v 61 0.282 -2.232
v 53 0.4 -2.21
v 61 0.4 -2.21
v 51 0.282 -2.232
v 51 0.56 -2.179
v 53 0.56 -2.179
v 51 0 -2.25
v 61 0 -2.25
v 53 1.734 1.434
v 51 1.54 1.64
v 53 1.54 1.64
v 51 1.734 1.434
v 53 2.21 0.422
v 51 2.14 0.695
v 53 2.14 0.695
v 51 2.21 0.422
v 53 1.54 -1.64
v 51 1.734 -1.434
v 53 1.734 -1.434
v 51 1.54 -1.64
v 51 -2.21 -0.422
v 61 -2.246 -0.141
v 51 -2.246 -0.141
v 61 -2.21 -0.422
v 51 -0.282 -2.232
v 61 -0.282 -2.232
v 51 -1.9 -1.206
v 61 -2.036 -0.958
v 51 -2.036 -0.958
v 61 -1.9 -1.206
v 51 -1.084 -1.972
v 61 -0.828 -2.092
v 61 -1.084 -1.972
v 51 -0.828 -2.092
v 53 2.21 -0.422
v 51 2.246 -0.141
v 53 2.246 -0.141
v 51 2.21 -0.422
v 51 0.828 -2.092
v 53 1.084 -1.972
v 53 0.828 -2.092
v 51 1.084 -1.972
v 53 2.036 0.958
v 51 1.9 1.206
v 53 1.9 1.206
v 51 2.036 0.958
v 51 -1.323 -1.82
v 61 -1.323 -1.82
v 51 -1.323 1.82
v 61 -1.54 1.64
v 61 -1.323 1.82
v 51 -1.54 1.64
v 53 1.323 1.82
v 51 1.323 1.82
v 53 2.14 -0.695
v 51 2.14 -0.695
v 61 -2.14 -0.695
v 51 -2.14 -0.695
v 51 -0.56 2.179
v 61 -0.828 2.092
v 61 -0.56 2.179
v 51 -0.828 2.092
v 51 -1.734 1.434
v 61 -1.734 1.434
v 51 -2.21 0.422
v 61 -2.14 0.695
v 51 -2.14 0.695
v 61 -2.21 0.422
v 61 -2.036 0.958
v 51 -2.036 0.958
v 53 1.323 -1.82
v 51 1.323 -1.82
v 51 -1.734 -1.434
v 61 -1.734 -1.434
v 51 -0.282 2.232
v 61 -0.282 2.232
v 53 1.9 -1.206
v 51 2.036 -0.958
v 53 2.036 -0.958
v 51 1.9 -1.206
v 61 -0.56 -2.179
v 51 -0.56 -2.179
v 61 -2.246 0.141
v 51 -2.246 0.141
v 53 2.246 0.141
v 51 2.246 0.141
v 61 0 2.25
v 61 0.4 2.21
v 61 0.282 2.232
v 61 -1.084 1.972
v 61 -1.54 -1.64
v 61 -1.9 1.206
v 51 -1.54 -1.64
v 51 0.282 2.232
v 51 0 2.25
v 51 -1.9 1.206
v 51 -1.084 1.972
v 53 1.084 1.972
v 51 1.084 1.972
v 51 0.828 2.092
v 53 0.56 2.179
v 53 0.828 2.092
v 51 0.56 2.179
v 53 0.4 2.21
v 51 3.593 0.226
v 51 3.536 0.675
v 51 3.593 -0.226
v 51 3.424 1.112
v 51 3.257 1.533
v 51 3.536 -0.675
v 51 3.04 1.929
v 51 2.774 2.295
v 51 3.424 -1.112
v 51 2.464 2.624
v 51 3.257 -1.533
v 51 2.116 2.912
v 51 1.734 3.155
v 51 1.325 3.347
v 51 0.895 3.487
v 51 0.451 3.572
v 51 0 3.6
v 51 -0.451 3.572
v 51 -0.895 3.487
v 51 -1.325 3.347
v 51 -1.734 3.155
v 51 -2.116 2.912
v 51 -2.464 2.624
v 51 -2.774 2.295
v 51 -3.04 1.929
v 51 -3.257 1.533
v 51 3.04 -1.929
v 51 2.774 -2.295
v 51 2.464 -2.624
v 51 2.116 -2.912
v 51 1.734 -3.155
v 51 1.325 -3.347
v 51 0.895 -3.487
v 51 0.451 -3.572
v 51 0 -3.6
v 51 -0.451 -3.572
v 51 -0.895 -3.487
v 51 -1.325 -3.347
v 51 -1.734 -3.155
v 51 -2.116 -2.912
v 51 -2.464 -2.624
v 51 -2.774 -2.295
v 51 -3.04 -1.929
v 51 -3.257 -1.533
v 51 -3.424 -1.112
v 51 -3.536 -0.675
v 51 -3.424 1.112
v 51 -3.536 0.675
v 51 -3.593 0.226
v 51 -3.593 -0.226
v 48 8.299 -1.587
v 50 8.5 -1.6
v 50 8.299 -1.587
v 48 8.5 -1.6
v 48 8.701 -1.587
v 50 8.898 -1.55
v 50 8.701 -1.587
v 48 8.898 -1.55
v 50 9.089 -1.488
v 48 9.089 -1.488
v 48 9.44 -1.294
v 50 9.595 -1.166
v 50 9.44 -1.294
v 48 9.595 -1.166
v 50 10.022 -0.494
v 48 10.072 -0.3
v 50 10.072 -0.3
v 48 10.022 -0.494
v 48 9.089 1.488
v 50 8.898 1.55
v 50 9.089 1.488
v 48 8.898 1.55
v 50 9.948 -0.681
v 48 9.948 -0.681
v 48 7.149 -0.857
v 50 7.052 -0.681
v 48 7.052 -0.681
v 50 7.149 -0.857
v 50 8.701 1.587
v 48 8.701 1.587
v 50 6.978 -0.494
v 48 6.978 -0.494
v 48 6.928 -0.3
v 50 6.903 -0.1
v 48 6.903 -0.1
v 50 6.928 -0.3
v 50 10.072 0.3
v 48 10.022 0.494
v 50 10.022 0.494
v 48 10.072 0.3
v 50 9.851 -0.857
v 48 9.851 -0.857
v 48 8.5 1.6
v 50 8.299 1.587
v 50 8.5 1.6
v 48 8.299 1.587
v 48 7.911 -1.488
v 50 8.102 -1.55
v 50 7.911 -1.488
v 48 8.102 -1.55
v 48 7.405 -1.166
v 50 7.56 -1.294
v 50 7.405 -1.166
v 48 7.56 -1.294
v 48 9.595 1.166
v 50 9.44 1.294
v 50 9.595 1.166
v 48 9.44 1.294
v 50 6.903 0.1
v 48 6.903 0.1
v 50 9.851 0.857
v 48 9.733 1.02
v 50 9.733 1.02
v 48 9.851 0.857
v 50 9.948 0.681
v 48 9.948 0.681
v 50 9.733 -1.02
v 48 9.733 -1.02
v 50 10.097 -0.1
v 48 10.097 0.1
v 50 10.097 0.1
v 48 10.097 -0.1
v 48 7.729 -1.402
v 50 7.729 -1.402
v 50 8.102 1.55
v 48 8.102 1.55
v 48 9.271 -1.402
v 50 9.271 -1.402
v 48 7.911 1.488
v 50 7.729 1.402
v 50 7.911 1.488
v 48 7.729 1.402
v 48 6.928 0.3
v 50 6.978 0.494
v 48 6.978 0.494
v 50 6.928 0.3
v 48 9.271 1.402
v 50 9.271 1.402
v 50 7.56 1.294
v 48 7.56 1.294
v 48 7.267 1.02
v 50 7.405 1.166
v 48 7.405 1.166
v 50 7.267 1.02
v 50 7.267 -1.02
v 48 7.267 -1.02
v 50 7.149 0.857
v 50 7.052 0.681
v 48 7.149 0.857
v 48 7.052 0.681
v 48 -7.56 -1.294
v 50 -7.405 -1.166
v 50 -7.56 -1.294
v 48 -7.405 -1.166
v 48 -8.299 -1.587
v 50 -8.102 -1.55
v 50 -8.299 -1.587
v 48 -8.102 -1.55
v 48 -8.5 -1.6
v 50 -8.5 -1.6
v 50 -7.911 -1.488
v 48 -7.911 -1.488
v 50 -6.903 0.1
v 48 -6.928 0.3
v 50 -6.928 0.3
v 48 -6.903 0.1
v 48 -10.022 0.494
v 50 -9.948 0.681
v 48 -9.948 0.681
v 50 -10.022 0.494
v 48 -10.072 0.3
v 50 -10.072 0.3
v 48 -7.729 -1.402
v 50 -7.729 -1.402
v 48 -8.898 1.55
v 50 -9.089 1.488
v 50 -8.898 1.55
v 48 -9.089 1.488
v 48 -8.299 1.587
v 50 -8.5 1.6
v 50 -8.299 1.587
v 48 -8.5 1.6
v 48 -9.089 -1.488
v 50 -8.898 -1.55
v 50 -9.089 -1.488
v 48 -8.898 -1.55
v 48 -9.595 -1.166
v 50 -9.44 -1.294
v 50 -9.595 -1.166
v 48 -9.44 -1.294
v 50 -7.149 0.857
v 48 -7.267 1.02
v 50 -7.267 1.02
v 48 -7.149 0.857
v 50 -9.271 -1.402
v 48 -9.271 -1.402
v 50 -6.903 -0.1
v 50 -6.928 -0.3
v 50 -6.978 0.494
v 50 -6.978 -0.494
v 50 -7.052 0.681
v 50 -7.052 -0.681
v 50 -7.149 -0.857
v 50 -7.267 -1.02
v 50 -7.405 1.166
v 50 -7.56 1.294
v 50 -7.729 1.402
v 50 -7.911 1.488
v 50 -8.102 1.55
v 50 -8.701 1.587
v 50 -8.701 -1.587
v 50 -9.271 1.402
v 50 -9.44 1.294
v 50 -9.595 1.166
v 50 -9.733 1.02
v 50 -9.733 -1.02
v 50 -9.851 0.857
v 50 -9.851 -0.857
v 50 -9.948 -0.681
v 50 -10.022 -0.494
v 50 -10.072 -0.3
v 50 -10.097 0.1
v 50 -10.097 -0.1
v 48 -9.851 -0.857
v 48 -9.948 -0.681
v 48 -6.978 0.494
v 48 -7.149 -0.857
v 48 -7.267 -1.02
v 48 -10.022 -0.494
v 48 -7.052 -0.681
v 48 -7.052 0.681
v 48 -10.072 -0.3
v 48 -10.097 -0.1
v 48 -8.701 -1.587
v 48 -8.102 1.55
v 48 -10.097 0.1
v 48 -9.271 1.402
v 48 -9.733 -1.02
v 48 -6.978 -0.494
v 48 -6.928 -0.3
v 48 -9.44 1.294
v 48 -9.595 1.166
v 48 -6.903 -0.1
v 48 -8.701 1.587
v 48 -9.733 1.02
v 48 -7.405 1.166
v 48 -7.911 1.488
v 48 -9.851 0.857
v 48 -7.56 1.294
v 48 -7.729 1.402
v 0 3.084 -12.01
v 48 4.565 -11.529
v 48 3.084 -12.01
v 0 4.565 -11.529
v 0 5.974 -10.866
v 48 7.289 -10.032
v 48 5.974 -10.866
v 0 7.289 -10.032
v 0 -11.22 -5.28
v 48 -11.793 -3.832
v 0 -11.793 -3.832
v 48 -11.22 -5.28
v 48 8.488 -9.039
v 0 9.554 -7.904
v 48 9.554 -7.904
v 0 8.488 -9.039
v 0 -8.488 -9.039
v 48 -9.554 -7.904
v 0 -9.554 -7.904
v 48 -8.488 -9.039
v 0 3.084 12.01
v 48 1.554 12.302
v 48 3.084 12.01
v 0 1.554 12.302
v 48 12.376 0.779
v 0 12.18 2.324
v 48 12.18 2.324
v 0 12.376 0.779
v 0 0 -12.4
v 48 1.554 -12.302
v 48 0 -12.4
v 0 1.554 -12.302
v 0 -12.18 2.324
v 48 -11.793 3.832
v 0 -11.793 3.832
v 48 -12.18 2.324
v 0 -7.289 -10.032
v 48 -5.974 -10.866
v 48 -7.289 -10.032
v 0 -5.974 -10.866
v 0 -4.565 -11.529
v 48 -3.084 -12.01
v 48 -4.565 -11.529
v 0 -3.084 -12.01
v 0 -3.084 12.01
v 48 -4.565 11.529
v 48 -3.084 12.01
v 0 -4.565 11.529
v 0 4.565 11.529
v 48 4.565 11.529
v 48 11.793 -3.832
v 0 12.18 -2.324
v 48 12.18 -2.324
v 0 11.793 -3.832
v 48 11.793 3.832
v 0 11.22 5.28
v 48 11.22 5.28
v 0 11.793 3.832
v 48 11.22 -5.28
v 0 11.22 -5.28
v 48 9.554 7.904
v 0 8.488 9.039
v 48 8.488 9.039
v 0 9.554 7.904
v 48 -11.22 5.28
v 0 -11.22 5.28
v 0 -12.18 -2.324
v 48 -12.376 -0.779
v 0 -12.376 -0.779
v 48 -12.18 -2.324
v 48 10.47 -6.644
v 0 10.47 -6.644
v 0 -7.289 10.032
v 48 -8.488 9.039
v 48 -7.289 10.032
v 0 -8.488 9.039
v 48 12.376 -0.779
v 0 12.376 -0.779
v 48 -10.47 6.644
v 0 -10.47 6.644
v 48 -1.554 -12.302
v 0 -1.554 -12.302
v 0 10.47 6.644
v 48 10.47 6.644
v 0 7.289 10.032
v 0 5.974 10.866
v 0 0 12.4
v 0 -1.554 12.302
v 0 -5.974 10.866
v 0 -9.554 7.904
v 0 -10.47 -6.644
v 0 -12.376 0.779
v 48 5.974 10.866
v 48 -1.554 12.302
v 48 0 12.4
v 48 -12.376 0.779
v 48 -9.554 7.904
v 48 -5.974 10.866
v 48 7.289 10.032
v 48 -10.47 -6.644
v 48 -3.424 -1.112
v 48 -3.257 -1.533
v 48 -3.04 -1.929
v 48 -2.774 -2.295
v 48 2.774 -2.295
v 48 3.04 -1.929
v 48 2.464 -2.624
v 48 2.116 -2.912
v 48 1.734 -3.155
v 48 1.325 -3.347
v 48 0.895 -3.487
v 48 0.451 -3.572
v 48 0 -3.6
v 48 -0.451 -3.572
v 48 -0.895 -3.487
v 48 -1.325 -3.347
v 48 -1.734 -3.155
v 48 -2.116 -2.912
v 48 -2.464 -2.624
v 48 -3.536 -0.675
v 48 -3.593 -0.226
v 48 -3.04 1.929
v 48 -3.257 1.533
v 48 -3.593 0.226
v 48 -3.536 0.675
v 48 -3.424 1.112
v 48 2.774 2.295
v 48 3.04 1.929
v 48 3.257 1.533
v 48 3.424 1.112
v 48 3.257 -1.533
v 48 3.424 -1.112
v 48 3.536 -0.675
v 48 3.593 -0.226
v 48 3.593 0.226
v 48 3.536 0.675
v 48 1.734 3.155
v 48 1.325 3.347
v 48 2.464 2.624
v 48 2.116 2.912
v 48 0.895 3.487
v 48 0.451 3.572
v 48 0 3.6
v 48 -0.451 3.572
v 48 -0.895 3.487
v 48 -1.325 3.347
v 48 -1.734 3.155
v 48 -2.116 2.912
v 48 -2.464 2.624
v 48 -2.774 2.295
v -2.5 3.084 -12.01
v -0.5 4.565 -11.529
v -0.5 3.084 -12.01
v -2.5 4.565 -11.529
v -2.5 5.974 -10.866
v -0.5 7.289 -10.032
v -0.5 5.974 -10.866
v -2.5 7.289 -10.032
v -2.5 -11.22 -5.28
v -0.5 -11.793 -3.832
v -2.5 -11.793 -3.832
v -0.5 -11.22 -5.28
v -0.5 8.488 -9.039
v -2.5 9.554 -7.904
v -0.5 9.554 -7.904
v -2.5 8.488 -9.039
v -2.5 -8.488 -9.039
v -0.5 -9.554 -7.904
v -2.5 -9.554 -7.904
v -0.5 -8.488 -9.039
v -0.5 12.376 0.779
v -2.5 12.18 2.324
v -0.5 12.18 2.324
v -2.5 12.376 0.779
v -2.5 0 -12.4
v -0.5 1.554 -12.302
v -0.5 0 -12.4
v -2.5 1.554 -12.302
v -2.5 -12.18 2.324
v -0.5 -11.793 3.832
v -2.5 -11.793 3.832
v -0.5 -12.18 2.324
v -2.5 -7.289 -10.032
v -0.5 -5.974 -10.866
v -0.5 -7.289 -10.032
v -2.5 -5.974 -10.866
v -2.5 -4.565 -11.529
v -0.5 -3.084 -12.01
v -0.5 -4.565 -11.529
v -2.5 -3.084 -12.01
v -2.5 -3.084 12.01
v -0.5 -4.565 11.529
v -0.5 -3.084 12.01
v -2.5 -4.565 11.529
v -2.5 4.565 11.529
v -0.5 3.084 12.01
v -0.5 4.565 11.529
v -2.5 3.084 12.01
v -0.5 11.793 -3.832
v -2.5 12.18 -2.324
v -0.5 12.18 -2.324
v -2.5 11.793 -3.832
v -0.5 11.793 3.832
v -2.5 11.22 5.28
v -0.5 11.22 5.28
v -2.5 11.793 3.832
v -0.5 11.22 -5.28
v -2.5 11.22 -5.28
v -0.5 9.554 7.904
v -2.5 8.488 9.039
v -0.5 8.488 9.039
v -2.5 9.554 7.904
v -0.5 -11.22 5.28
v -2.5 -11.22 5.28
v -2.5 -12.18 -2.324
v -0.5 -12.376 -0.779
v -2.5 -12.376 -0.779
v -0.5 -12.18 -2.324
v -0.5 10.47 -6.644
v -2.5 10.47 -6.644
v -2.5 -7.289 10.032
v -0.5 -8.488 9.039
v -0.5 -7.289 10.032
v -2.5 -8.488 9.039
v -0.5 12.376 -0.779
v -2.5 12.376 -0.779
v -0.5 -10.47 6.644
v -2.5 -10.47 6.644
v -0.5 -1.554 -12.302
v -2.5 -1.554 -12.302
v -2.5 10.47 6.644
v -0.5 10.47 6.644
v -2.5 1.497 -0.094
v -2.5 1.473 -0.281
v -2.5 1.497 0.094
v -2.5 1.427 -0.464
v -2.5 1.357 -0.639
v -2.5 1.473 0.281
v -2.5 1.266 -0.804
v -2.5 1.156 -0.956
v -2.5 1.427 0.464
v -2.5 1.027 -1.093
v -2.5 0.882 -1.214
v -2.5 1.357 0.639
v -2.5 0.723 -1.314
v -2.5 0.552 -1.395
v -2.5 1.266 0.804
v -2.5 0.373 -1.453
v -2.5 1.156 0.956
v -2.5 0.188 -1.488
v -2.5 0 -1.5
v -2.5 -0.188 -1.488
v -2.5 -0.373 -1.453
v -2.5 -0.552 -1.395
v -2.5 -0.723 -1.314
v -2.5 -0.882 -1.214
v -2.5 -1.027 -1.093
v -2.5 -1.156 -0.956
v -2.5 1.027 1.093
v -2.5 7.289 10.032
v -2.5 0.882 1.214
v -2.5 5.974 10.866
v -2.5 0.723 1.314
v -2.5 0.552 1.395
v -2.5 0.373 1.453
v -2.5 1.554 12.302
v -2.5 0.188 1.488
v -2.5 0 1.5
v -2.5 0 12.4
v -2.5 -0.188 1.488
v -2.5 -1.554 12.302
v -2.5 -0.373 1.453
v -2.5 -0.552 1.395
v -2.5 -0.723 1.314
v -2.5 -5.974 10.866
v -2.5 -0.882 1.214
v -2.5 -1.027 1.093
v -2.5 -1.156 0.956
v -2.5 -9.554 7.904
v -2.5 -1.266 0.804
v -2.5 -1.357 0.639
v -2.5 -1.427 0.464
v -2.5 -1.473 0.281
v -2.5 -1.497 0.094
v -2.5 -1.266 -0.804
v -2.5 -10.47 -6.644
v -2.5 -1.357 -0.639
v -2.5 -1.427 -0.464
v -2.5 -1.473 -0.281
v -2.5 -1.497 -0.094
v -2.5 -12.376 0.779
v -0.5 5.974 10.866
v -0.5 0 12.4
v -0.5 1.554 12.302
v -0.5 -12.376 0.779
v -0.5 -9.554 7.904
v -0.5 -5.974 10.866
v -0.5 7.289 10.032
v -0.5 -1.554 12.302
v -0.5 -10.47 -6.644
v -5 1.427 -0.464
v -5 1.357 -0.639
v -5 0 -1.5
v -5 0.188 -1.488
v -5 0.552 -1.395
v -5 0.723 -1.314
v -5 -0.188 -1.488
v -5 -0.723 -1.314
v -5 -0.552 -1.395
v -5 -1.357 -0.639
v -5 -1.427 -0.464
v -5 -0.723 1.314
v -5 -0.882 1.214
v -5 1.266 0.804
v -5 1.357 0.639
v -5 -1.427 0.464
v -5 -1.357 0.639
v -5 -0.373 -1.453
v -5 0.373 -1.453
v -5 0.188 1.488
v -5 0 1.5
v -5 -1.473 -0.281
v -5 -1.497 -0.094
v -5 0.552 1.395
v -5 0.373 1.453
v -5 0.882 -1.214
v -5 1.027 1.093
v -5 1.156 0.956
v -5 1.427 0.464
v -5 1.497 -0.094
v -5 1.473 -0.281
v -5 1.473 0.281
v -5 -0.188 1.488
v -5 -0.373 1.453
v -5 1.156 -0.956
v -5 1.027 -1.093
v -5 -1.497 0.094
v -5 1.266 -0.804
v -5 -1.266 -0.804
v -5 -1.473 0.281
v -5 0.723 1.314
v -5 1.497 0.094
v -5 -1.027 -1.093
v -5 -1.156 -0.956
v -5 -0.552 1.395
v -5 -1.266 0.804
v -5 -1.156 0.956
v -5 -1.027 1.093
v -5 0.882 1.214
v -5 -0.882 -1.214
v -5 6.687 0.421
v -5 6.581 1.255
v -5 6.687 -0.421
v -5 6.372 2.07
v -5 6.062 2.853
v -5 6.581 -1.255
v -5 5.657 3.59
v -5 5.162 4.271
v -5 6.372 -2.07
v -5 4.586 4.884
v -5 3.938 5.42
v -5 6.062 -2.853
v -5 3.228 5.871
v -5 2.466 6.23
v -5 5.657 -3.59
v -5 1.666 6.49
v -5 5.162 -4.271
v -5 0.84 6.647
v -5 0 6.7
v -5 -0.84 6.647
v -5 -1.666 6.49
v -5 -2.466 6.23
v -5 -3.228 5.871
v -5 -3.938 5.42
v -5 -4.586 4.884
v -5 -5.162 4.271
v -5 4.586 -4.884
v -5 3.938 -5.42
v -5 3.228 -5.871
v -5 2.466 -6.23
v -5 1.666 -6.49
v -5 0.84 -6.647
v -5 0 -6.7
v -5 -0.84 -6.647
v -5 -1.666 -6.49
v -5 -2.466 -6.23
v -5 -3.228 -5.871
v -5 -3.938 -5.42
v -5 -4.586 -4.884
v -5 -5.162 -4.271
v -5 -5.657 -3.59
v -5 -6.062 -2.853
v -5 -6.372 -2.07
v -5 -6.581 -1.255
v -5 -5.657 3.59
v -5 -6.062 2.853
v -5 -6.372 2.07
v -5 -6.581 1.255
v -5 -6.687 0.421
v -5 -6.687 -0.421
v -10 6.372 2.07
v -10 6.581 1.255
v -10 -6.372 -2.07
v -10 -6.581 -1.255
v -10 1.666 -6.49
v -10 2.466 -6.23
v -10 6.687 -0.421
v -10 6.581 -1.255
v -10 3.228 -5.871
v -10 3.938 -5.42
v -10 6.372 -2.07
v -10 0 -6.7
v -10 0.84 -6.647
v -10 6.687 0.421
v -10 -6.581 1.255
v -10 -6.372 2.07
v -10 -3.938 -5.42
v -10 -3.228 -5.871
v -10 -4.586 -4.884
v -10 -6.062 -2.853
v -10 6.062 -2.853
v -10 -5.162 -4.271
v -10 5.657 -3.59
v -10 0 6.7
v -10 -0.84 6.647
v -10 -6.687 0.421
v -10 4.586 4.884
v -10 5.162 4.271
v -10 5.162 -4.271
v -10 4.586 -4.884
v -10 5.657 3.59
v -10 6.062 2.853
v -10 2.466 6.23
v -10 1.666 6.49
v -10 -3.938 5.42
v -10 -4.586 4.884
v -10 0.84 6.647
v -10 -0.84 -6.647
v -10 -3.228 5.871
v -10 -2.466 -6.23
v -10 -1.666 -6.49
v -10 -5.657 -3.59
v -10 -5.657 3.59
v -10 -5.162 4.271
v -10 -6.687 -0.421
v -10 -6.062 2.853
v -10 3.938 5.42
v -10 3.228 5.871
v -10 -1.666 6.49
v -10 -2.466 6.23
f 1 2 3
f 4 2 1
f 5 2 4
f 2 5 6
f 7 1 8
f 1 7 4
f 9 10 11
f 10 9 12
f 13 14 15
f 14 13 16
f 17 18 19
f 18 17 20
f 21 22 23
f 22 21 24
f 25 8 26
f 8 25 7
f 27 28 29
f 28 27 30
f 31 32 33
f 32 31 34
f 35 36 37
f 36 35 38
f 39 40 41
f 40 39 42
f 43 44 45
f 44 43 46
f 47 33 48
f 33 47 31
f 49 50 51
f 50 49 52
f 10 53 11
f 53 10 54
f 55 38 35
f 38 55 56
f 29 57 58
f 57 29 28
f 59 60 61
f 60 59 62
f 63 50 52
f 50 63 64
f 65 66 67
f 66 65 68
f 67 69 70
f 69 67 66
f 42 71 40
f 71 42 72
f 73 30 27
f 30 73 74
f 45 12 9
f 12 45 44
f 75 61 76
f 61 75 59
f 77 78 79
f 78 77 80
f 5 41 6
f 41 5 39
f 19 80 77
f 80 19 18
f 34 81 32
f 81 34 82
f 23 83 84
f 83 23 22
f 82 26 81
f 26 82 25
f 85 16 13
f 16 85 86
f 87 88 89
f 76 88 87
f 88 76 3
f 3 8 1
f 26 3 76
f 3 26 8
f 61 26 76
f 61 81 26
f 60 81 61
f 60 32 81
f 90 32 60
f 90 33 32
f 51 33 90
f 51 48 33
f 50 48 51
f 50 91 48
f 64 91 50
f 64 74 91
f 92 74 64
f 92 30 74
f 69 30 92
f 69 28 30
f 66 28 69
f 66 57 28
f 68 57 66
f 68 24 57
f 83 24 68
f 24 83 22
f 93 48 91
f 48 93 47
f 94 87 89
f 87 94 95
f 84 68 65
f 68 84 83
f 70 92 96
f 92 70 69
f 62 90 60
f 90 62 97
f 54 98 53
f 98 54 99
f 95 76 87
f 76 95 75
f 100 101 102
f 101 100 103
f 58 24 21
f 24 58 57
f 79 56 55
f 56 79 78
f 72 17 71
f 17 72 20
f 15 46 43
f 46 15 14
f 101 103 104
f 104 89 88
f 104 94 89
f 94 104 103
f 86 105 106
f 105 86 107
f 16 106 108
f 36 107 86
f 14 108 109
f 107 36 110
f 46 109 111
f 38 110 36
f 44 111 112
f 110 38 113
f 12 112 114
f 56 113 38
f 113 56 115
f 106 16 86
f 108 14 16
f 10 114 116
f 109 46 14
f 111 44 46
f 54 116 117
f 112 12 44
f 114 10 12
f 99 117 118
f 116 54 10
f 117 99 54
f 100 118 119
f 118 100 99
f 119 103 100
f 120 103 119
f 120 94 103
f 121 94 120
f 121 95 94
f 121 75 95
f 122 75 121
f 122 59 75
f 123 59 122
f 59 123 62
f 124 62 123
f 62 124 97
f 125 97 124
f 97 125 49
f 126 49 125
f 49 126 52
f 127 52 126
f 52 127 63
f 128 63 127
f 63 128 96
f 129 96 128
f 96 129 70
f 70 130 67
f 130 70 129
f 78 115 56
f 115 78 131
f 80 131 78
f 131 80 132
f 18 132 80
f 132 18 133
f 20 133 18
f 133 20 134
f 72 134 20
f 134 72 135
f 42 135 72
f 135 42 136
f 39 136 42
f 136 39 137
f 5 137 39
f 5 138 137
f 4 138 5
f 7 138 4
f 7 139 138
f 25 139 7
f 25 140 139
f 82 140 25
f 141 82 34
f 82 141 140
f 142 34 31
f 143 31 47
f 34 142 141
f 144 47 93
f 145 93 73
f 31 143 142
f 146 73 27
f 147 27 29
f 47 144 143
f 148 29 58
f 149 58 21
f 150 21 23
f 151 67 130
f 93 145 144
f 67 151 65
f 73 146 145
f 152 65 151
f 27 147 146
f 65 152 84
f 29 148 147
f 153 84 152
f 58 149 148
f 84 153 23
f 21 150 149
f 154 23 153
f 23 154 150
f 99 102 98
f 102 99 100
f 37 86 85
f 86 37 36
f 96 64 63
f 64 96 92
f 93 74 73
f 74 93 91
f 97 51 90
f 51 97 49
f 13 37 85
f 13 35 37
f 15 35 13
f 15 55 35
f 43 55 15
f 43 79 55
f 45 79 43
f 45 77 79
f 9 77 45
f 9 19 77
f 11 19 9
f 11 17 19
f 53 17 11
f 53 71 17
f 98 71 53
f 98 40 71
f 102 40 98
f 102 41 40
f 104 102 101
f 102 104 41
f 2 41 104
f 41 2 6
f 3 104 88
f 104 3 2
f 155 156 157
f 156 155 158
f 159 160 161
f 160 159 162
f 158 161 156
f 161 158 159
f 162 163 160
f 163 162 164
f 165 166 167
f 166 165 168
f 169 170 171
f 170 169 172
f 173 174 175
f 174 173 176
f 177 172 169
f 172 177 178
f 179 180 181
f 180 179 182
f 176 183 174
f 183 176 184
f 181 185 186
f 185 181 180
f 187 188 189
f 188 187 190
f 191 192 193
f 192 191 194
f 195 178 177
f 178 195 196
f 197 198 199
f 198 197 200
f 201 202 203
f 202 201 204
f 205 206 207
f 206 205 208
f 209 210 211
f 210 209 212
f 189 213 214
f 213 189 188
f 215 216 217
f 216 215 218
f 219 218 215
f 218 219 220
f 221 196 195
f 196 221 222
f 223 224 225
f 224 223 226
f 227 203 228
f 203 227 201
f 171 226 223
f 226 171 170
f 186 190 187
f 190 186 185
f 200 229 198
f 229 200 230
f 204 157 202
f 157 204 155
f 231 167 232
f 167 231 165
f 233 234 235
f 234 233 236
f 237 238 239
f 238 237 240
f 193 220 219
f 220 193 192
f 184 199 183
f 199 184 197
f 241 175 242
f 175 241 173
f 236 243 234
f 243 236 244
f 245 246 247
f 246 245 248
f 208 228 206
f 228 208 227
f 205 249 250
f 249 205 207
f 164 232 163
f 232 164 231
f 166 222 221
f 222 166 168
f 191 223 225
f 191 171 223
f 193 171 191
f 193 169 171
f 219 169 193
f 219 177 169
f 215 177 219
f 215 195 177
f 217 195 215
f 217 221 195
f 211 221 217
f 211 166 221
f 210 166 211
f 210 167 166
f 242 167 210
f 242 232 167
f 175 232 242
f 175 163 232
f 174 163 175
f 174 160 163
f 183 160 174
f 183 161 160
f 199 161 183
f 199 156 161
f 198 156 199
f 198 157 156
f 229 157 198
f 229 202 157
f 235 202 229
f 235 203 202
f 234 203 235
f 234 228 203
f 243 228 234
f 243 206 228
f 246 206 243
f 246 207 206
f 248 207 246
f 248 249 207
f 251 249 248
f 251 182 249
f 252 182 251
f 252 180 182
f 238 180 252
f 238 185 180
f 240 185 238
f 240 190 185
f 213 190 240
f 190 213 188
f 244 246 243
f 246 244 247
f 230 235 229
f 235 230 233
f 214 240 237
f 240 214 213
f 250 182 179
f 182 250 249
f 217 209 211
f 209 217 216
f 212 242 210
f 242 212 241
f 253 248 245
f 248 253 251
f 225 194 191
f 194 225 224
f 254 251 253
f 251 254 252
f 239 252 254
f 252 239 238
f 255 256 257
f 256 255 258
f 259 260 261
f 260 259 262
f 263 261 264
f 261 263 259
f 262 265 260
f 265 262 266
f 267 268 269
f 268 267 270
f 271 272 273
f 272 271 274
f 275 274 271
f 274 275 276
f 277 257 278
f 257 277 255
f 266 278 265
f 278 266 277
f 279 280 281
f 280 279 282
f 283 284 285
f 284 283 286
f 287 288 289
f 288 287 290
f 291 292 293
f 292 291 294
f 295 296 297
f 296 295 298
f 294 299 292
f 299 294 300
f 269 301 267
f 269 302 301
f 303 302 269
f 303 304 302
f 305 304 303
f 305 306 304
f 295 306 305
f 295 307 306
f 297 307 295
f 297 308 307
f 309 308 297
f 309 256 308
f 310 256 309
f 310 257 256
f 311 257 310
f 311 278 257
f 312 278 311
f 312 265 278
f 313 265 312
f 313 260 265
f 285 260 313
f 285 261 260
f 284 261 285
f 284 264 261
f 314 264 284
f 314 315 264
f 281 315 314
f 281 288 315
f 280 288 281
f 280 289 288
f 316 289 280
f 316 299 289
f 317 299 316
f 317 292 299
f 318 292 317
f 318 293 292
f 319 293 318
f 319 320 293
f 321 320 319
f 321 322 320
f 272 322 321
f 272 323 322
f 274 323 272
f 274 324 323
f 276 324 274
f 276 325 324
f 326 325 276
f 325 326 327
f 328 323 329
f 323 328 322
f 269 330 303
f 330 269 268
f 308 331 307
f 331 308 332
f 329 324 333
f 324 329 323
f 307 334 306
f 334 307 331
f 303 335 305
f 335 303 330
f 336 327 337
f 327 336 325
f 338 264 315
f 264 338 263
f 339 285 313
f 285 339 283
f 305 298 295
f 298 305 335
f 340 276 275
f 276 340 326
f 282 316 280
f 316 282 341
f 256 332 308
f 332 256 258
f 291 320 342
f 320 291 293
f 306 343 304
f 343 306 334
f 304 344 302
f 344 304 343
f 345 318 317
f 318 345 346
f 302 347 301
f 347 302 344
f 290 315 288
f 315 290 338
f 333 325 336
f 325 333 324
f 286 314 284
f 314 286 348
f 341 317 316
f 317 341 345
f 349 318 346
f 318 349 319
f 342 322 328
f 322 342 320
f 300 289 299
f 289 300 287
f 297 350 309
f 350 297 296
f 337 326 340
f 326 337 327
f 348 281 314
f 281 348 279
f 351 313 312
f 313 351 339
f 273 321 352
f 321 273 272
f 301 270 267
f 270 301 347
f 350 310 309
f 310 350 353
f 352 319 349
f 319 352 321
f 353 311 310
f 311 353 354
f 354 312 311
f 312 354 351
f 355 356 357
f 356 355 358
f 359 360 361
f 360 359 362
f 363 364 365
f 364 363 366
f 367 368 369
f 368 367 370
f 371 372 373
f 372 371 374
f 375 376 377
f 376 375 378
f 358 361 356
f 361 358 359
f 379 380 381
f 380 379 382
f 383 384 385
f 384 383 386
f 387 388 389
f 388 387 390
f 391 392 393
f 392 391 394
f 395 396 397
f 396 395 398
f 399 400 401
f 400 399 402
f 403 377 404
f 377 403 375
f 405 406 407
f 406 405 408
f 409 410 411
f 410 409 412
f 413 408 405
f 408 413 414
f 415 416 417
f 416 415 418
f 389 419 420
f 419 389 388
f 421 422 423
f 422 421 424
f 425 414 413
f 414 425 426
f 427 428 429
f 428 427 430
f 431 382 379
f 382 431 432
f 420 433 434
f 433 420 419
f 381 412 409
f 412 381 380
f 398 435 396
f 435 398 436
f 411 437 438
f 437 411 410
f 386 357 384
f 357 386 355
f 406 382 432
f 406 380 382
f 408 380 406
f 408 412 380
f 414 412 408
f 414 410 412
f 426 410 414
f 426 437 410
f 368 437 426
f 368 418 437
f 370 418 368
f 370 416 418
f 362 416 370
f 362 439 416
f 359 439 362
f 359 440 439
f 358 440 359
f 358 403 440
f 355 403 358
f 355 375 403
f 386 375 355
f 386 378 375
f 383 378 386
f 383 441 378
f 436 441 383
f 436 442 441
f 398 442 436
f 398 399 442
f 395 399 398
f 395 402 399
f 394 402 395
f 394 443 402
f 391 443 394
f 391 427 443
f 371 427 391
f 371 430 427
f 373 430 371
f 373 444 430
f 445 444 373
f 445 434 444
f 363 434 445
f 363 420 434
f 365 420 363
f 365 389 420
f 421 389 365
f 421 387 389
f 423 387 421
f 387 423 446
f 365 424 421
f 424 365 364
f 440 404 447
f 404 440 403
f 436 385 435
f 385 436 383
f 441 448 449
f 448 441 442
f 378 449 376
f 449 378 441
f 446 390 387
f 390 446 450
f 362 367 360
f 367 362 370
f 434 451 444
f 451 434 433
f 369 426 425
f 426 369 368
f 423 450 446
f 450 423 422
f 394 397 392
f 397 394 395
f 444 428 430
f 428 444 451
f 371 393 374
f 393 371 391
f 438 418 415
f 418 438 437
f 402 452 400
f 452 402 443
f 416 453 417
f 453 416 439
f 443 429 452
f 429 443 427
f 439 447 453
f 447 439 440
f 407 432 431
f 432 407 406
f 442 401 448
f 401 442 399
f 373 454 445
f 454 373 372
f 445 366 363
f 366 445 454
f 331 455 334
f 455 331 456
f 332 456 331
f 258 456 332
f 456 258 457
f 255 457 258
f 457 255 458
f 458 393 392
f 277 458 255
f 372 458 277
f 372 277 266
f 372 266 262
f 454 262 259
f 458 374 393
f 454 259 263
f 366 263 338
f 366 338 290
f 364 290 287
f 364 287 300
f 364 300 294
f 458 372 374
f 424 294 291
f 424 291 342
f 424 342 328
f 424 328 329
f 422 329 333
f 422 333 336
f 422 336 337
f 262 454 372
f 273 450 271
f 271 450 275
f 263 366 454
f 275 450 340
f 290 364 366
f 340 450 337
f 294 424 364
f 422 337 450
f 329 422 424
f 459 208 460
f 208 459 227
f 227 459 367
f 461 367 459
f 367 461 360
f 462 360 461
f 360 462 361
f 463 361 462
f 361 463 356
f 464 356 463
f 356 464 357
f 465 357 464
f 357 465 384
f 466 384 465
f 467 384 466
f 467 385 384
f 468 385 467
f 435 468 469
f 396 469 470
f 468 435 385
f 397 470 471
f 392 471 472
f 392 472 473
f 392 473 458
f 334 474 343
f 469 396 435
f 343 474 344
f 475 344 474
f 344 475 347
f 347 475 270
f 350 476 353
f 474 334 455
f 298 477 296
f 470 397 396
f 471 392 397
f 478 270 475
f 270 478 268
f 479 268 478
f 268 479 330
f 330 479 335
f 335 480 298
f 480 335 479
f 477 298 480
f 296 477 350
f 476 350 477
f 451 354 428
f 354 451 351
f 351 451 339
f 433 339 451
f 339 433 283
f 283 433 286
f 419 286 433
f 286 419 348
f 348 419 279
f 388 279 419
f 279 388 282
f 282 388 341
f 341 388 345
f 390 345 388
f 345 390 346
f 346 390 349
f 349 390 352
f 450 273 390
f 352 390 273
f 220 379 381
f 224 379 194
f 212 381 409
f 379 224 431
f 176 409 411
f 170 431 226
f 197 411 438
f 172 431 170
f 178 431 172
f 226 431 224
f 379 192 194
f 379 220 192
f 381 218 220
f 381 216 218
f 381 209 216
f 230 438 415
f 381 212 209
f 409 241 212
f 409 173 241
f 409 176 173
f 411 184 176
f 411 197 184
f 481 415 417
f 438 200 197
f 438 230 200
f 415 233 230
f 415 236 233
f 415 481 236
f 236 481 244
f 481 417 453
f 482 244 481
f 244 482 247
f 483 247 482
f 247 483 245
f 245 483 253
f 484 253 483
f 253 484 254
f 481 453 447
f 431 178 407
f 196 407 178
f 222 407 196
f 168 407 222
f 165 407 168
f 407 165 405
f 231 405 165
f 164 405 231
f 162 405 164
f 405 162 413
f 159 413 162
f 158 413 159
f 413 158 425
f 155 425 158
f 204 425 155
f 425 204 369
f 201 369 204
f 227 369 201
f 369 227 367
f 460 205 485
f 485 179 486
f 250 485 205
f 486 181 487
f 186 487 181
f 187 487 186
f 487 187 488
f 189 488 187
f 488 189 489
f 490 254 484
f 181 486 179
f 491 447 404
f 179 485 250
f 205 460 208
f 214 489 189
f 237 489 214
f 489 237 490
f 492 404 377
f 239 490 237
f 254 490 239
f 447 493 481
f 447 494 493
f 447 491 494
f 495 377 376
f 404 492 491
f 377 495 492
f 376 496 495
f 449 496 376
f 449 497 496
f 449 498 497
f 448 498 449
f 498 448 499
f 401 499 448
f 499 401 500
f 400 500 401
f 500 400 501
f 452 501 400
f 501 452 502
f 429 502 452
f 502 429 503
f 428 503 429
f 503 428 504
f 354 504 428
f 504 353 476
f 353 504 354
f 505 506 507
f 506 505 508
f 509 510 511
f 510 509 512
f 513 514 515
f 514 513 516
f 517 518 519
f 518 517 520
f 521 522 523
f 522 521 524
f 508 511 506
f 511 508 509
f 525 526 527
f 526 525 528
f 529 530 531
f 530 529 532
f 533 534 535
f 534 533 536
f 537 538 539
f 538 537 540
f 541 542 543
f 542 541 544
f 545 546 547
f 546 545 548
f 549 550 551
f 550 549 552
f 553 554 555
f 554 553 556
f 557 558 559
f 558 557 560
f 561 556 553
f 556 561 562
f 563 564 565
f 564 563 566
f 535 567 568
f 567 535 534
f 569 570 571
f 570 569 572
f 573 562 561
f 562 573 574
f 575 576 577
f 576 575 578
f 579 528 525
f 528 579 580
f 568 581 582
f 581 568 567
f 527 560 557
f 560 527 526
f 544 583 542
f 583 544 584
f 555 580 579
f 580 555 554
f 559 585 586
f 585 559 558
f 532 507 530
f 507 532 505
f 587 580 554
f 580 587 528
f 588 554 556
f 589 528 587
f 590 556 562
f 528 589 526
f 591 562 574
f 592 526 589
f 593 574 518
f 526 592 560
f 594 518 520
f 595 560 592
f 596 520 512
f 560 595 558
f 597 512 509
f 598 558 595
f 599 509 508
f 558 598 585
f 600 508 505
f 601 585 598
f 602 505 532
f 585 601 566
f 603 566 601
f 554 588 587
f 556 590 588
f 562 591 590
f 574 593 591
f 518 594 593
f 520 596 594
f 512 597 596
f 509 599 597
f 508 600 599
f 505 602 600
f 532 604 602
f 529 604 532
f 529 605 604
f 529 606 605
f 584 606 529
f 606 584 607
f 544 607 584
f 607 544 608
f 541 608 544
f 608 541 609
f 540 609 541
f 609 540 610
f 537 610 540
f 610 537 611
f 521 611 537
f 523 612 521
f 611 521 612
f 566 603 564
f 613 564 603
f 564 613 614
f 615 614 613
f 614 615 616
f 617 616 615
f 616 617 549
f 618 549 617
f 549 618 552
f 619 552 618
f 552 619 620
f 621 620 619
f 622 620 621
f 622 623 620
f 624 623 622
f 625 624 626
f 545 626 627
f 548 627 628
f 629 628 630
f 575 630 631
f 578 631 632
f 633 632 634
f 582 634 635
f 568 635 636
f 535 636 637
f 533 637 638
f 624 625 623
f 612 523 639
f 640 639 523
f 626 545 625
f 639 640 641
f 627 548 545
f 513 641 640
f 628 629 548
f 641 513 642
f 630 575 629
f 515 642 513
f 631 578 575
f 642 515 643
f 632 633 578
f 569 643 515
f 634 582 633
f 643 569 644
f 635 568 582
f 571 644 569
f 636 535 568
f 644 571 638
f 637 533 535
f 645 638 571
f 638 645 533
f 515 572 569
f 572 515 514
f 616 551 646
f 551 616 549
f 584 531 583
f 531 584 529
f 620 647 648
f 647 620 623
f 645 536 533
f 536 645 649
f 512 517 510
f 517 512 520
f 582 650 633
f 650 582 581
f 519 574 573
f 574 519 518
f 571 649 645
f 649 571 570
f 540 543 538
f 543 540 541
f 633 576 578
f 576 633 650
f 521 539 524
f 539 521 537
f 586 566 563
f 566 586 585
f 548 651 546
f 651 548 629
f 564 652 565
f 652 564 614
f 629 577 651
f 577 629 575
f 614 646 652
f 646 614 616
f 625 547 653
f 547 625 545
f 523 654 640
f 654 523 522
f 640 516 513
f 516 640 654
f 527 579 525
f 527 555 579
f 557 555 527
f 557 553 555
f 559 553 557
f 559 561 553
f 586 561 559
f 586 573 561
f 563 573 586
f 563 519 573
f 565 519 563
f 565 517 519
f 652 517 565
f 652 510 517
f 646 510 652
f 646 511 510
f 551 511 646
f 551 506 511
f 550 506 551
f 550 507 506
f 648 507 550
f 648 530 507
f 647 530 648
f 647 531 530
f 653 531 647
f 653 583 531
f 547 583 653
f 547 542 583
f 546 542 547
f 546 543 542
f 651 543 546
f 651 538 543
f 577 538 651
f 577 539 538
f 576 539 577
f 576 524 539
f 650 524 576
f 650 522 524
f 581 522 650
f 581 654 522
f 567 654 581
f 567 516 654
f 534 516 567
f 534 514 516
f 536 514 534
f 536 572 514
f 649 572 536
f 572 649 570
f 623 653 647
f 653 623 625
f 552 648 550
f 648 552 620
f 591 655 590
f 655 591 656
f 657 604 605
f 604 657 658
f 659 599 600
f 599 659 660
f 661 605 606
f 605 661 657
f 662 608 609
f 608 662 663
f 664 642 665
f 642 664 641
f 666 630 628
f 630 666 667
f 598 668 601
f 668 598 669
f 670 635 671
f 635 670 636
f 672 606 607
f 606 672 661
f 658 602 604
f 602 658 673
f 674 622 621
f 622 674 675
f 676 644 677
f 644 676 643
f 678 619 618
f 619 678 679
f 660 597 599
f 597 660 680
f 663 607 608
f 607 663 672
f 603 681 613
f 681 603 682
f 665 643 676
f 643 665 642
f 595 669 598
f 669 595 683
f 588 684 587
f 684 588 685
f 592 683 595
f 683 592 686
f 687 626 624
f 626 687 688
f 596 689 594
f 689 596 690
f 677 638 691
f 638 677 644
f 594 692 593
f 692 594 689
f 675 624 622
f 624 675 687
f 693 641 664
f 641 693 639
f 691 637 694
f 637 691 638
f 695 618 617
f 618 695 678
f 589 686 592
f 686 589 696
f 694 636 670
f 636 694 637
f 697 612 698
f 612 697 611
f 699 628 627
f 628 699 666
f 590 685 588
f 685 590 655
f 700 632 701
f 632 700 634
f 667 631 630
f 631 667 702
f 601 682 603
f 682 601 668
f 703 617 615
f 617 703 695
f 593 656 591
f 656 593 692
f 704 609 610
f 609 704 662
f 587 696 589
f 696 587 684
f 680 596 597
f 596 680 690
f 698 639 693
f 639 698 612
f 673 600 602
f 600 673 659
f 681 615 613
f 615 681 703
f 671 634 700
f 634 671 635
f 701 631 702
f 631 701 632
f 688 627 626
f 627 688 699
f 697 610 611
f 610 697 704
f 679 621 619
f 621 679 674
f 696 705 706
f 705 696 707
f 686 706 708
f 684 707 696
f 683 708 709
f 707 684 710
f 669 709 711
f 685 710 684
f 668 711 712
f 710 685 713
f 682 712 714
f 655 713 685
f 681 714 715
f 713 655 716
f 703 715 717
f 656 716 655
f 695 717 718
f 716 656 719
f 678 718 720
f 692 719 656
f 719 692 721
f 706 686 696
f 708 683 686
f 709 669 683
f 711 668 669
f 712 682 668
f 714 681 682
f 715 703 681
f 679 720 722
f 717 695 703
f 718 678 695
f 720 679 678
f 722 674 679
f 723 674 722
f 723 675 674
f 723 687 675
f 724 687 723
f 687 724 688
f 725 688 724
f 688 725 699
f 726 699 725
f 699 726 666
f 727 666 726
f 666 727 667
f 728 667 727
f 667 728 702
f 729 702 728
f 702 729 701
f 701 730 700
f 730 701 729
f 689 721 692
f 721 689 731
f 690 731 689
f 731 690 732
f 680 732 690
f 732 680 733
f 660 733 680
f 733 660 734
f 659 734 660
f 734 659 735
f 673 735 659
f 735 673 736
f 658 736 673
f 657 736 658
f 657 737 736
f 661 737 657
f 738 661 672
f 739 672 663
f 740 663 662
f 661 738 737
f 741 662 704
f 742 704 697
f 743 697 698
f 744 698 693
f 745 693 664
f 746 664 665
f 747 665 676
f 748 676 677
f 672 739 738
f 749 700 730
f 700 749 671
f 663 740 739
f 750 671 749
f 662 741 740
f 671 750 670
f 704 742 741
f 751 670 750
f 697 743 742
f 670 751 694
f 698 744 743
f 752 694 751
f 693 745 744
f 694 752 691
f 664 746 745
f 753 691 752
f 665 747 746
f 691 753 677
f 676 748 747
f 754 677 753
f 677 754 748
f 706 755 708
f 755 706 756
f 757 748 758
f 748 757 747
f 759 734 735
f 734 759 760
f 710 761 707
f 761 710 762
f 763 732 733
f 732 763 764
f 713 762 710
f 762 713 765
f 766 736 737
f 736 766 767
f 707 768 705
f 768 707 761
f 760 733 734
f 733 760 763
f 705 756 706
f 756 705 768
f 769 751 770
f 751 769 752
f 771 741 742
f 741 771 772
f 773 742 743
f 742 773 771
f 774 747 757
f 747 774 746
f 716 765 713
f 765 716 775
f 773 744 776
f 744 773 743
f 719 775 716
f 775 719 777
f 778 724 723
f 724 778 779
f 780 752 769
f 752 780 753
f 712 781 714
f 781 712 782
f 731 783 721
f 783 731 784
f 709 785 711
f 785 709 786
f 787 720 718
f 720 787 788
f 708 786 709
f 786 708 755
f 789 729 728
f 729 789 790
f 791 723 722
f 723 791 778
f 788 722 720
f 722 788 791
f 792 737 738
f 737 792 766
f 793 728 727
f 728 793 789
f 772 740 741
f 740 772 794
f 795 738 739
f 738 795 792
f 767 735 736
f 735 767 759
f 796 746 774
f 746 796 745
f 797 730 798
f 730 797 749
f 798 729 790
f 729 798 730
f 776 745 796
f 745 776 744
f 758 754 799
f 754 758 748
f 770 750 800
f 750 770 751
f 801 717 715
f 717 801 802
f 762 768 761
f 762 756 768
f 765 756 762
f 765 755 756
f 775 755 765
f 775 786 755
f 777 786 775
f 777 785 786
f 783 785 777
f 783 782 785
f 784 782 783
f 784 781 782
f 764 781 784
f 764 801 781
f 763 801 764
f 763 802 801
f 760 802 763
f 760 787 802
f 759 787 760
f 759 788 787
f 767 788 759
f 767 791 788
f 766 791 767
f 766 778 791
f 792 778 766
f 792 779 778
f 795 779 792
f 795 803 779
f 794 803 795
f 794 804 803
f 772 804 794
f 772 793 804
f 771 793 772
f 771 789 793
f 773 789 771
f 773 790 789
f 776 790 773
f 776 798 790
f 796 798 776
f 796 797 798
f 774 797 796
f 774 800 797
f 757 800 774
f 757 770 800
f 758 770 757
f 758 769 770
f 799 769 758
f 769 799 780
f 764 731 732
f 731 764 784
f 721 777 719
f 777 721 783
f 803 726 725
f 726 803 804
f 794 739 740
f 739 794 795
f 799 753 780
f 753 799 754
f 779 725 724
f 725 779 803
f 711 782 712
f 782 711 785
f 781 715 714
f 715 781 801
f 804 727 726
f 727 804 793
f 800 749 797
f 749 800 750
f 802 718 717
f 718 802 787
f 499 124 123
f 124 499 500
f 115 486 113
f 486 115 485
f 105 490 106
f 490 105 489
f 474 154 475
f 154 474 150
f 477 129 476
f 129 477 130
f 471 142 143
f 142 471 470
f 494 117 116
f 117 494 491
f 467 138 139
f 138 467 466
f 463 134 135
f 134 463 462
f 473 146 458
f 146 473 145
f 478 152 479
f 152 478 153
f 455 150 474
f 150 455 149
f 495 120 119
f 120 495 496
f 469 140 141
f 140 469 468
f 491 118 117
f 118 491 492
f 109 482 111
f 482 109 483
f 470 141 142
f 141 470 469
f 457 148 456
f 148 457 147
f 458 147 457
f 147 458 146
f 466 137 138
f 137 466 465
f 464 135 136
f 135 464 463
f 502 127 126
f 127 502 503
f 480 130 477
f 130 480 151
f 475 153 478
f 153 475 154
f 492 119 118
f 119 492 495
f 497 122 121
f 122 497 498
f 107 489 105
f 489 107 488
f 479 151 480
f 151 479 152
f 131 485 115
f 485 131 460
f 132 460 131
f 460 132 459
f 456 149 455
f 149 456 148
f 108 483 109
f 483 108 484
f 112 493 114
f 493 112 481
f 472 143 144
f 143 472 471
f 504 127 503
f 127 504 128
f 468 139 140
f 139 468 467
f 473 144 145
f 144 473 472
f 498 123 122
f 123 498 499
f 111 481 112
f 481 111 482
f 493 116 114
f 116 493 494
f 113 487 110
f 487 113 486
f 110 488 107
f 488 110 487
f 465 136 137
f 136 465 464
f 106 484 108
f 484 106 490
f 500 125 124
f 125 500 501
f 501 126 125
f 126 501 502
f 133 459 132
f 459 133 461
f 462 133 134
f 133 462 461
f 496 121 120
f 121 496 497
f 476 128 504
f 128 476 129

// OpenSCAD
// file: ../robot_settings.scad
main_box_x = 95; // 96
main_box_y = 102;
main_box_z = 74; // 74.5
wall_thickness = 2;

rail_gap = 2;
rail_inset = 7;

rail_thickness = 7;
rail_length = 250;
rail_width = 200;

raspberry_pi_screw_seperation_y = 57;
raspberry_pi_screw_seperation_z = 48;
raspberry_pi_peg_h = 5;

battery_box_peg_h = 6;
battery_box_peg_d = 8;
battery_box_peg_cutout = 5;

gears_module = 1;
pinion_gear_teeth = 32;
pinion_gear_width = 5;
pinion_gear_bore = 8;

gears_setback_distance = 25;
gear_post_height = 2 * pinion_gear_width + rail_thickness + 8 ;

steering_motor_mount_x = 45;
steering_motor_mount_y = 36;
steering_motor_mount_z = 18;
steering_motor_mount_setback_distance = gears_setback_distance + 16;

dc_motor_drivertype = "Teyleten"; // Teyleten
isAdafruit = (dc_motor_drivertype == "Adafruit");

drv8871_x = isAdafruit ? 20.3 : 21.6;
drv8871_y = isAdafruit ?  24 : 25;

drv8871_z = 2;
drv8871_screw_d = 2.5;
drv8871_solder_points_z = 2;

drv8871mount_edge_x = 1.5;
drv8871mount_edge_wall = 3;
drv8871mount_z = 5;
drv8871mount_x = drv8871_x +  drv8871mount_edge_wall - 2* drv8871mount_edge_x;
drv8871mount_y = 19;

drv8871_screw_distance = 15.64;
drv8871_solder_points_d = 1.66;
drv8871_solder_offset_y = 4.4;
drv8871_solder_inner_points_distance = 5;
drv8871_solder_outer_points_distance = 12;

dc_motor_housing_minus_encoder_z = 48;
dc_motor_encoder_z = 9.33;
dc_motor_encoder_wheel_d = 13.4;
dc_motor_encoder_wheel_thickness = 5;
dc_motor_encoder_wheel_gap = 3;
dc_motor_encoder_circuit_thickness = 2;
dc_motor_cutout_d = 24.8;
dc_motor_cutout_z = 19.5;

dc_motor_screw_head_z = 2;
dc_motor_screw_head_d = 5.6;
dc_motor_screw_d = 3.2;
dc_motor_screw_offset = 8.5;

dc_motor_axle_ring_z = 3;
dc_motor_axle_ring_d = 7.2;
dc_motor_axle_cutout_d = 4.5;
dc_motor_axle_cutout_z = 10;
dc_motor_axle_notch_cutout = 0.4;
dc_motor_axle_notch_cutout_z = 6;

pdmount_x = 20;
pdmount_y = 30;
pdmount_z = 2;
pdmount_edge_x = 1.5;
pdmount_edge_wall = 3;

steering_shaft_z = 45;
steering_shaft_d = 7;
steering_shaft_motor_fitting_d = 9;
coupler_length = 24.6;
coupler_diameter = 14;
coupler_screw_d = 4;
coupler_screw_z_offset = 5;
coupler_gear_side_insert = 12.6;
steering_shaft_with_coupler_z = steering_shaft_z - coupler_gear_side_insert;

lidar_mount_y = 110;
lidar_mount_x = 65 + 20;
lidar_narrow_screws = 40;
lidar_wide_screws = 56;
lidar_front_to_back_screws = 70;
lidar_screw_d = 3;
lidar_circuitboard_x = 20;
lidar_circuitboard_y = 35;
lidar_circuitboard_z = 1.2;
lidar_cord_length = 29;

ball_bearing_height = 7;
ball_bearing_outer_diameter = 22;
ball_bearing_inner_diameter = 8;

 armature_holder_height = 20;
 armature_holder_thickness = 8;
pull_bar_peg_r = 3.2;
apparatus_locking_peg_d = 4;

rack_module = 1;
rack_length = main_box_x / 2;
rack_height = 10;
rack_width = 10;
rack_teeth = 30;
rack_bore = 3;

pull_bar_length = rail_width / 2 - rack_length + 1;

// tire hardware
axle_length = 30;
axle_reciever_inner_diameter = 7.75;
axle_reciever_length = 18.8;
axle_notch_length = 7;
axle_notch_cutout = 2.4;

// power distribution bar
power_bar_cutout_x = 96;
power_bar_y = 19.1;
power_bar_z = 1.5;
power_bar_screw_distance = 91.4;
power_bar_screw_d = 2.8;
power_bar_standoff_z = 5;
power_bar_standoff_d = 6.83;

// breadboard
breadboard_wall_thickness = 3;
breadboard_width = 55;
breadboard_length = 83;
breadboard_height = 10.5;
breadboard_notch_width = 4.2;
breadboard_longside_notch_separation = 58.2 - breadboard_notch_width / 2;
breadboard_shortside_notch_separation = 26.3 - breadboard_notch_width;

pico_expander_width = 63;
pico_expander_height = 57;
pico_screw_hole_offset = 3;
pico_screw_hole_d = 2.5;

usbhub_thickness = 11.7;
usbhub_depth = 37.5;
usbhub_width = 86.7;
usbhub_end_port_width = 14.8;
usbhub_end_port_height = 12;
usbhub_front_face_safe_zone_left = 15;
usbhub_front_face_safe_zone_right = 14.8;

switch_w = 16;
switch_cutout_d = 12.2;
switch_bump_h = 2;
switch_bump_l = 18.2;
// main file
 include <../robot_settings.scad> 
 
  $fn = 50;
  
module dc_motor()
{        
        rotate([0,90,0])
        cylinder(h = dc_motor_housing_minus_encoder_z, d = dc_motor_cutout_d);
      
      translate([
        -dc_motor_encoder_circuit_thickness - .5, 
        0, 
        0
        ])
        rotate([0,90,0])
       cylinder(h = dc_motor_encoder_circuit_thickness, d = dc_motor_cutout_d);
      
      translate([
        -dc_motor_encoder_circuit_thickness - dc_motor_encoder_wheel_gap, 
        0, 
        0
        ])
        rotate([0,90.0])
        cylinder(h = dc_motor_encoder_wheel_gap, d = 3);
        
      translate([
        -dc_motor_encoder_circuit_thickness - dc_motor_encoder_wheel_gap - dc_motor_encoder_wheel_thickness,
        0,
        0])
        rotate([0,90,0])
        cylinder(h = dc_motor_encoder_wheel_thickness, d = dc_motor_encoder_wheel_d);
        
        translate([
          dc_motor_housing_minus_encoder_z, 0, 0
        ])
        rotate([0,90,0])
          cylinder(h = dc_motor_axle_ring_z, d = dc_motor_axle_ring_d);
          
        translate([
          dc_motor_housing_minus_encoder_z + dc_motor_axle_ring_z,
          0,
          0
        ])
        rotate([0,90,0])
        {
          difference() {
            cylinder(h = dc_motor_axle_cutout_z, d = dc_motor_axle_cutout_d);          
             // axle notch
            translate([
              -3, 
              dc_motor_axle_notch_cutout,
              dc_motor_axle_cutout_z - axle_notch_length - 1
            ])
            cube([
              axle_notch_length , 
              axle_reciever_inner_diameter / 2, 
              dc_motor_axle_cutout_z]);
          }
          
          // screw holes
          color("blue")
          translate([0, dc_motor_screw_offset, - dc_motor_axle_ring_z - 1])
          cylinder(h = 3, d = dc_motor_screw_d);
          
          color("blue")         
          translate([0, -dc_motor_screw_offset, - dc_motor_axle_ring_z - 1])
          cylinder(h = 3, d = dc_motor_screw_d);
   
       }
}
dc_motor();
